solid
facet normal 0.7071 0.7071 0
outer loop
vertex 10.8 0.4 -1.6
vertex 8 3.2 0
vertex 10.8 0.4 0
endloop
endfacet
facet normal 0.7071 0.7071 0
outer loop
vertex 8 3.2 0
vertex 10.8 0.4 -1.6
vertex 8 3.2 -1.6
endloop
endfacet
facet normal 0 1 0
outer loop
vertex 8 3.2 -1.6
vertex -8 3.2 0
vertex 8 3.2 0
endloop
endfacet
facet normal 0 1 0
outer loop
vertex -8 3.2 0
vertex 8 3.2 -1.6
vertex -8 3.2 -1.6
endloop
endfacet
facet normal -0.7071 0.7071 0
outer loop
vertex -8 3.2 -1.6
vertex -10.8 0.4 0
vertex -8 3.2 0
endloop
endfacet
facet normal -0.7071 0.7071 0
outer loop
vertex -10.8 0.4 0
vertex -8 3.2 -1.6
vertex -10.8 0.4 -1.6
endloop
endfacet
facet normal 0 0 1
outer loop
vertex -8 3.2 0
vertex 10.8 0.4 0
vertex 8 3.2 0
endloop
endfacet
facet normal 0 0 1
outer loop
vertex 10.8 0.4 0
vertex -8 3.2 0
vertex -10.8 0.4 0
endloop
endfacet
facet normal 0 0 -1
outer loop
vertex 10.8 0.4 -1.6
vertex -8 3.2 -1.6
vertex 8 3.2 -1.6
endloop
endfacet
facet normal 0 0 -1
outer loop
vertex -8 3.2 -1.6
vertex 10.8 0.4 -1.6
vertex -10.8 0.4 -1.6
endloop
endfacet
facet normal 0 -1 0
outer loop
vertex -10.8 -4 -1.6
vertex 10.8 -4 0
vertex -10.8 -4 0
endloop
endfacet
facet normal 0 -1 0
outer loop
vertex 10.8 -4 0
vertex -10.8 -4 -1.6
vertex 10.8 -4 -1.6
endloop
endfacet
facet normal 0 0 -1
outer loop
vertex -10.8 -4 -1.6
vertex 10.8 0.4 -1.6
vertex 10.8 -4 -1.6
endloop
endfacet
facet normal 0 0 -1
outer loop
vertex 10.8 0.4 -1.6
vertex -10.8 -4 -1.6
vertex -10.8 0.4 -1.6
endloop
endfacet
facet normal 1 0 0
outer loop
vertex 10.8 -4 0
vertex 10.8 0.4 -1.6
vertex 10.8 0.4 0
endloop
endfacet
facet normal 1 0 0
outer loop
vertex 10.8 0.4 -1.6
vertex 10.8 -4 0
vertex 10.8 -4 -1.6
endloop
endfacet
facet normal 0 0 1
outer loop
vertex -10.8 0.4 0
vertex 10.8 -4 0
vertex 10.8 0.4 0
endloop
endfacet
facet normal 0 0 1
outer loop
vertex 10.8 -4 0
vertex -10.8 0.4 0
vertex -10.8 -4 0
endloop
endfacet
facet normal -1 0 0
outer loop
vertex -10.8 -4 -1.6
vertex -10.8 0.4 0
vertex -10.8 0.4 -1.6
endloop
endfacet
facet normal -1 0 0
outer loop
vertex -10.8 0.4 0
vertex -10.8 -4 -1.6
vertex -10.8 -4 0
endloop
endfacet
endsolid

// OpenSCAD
// file: ../p/rect3.scad
use <../lib.scad>
function ldraw_lib__rect3() = [
// 0 Rectangle with 3 Edges
// 0 Name: rect3.dat
// 0 Author: Mark Kennedy [mkennedy]
// 0 !LDRAW_ORG Primitive UPDATE 2010-01
// 0 !LICENSE Licensed under CC BY 2.0 and CC BY 4.0 : see CAreadme.txt
// 
// 0 BFC CERTIFY CCW
  [0,"BFC","CERTIFY"],
  [0,"BFC","CCW"],
// 
// 0 !HISTORY 2003-08-01 [PTadmin] Official Update 2003-02
// 0 !HISTORY 2007-06-24 [PTadmin] Header formatted for Contributor Agreement
// 0 !HISTORY 2008-07-01 [PTadmin] Official Update 2008-01
// 0 !HISTORY 2010-01-17 [mikeheide] Change winding to CCW
// 0 !HISTORY 2010-04-05 [PTadmin] Official Update 2010-01
// 
// 
// 2 24 1 0 1 -1 0 1
  [2,24,1,0,1,-1,0,1],
// 2 24 1 0 1 1 0 -1
  [2,24,1,0,1,1,0,-1],
// 2 24 -1 0 1 -1 0 -1
  [2,24,-1,0,1,-1,0,-1],
// 4 16 -1 0 1 -1 0 -1 1 0 -1 1 0 1
  [4,16,-1,0,1,-1,0,-1,1,0,-1,1,0,1],
// 0 //
];
module ldraw_lib__rect3(step=0, col=false, unit=2/5, alt=false, line=0.2, solid=!$preview)
    makepoly(ldraw_lib__rect3(), step=step, col=col, unit=unit, alt=alt, line=line, solid=solid);
ldraw_lib__rect3(line=0.2);
// file: ../p/rect.scad
use <../lib.scad>
function ldraw_lib__rect() = [
// 0 Rectangle
// 0 Name: rect.dat
// 0 Author: James Jessiman
// 0 !LDRAW_ORG Primitive UPDATE 2010-01
// 0 !LICENSE Licensed under CC BY 2.0 and CC BY 4.0 : see CAreadme.txt
// 
// 0 BFC CERTIFY CCW
  [0,"BFC","CERTIFY"],
  [0,"BFC","CCW"],
// 
// 0 !HISTORY 2002-04-05 [hafhead] Added BFC statement
// 0 !HISTORY 2002-04-25 [PTadmin] Official Update 2002-02
// 0 !HISTORY 2007-06-24 [PTadmin] Header formatted for Contributor Agreement
// 0 !HISTORY 2008-07-01 [PTadmin] Official Update 2008-01
// 0 !HISTORY 2010-01-17 [mikeheide] changed winding to CCW
// 0 !HISTORY 2010-04-05 [PTadmin] Official Update 2010-01
// 
// 
// 2 24 1 0 1 -1 0 1
  [2,24,1,0,1,-1,0,1],
// 2 24 -1 0 1 -1 0 -1
  [2,24,-1,0,1,-1,0,-1],
// 2 24 -1 0 -1 1 0 -1
  [2,24,-1,0,-1,1,0,-1],
// 2 24 1 0 -1 1 0 1
  [2,24,1,0,-1,1,0,1],
// 4 16 -1 0 1 -1 0 -1 1 0 -1 1 0 1
  [4,16,-1,0,1,-1,0,-1,1,0,-1,1,0,1],
// 0
];
module ldraw_lib__rect(step=0, col=false, unit=2/5, alt=false, line=0.2, solid=!$preview)
    makepoly(ldraw_lib__rect(), step=step, col=col, unit=unit, alt=alt, line=line, solid=solid);
ldraw_lib__rect(line=0.2);
// file: ../p/box5-4a.scad
use <../lib.scad>
function ldraw_lib__box5_4a() = [
// 0 Box with 5 Faces without 4 Adjacent Edges
// 0 Name: box5-4a.dat
// 0 Author: Guy Vivan [guyvivan]
// 0 !LDRAW_ORG Primitive UPDATE 2009-01
// 0 !LICENSE Licensed under CC BY 2.0 and CC BY 4.0 : see CAreadme.txt
// 
// 0 BFC CERTIFY CCW
  [0,"BFC","CERTIFY"],
  [0,"BFC","CCW"],
// 
// 0 !HISTORY 2009-05-02 [PTadmin] Official Update 2009-01
// 
// 
// 2 24 1 1 1 -1 1 1
  [2,24,1,1,1,-1,1,1],
// 2 24 -1 1 1 -1 1 -1
  [2,24,-1,1,1,-1,1,-1],
// 2 24 -1 1 -1 1 1 -1
  [2,24,-1,1,-1,1,1,-1],
// 2 24 1 1 -1 1 1 1
  [2,24,1,1,-1,1,1,1],
// 2 24 1 0 1 1 1 1
  [2,24,1,0,1,1,1,1],
// 2 24 -1 0 1 -1 1 1
  [2,24,-1,0,1,-1,1,1],
// 2 24 1 0 -1 1 1 -1
  [2,24,1,0,-1,1,1,-1],
// 2 24 -1 0 -1 -1 1 -1
  [2,24,-1,0,-1,-1,1,-1],
// 4 16 1 1 -1 -1 1 -1 -1 1 1 1 1 1
  [4,16,1,1,-1,-1,1,-1,-1,1,1,1,1,1],
// 4 16 -1 1 1 -1 0 1 1 0 1 1 1 1
  [4,16,-1,1,1,-1,0,1,1,0,1,1,1,1],
// 4 16 -1 1 -1 -1 0 -1 -1 0 1 -1 1 1
  [4,16,-1,1,-1,-1,0,-1,-1,0,1,-1,1,1],
// 4 16 1 1 -1 1 0 -1 -1 0 -1 -1 1 -1
  [4,16,1,1,-1,1,0,-1,-1,0,-1,-1,1,-1],
// 4 16 1 1 1 1 0 1 1 0 -1 1 1 -1
  [4,16,1,1,1,1,0,1,1,0,-1,1,1,-1],
// 0
];
module ldraw_lib__box5_4a(step=0, col=false, unit=2/5, alt=false, line=0.2, solid=!$preview)
    makepoly(ldraw_lib__box5_4a(), step=step, col=col, unit=unit, alt=alt, line=line, solid=solid);
ldraw_lib__box5_4a(line=0.2);
// main file
use <../lib.scad>
use <../p/box5-4a.scad>
use <../p/rect.scad>
use <../p/rect3.scad>
function ldraw_lib__11236() = [
// 0 ~Electric Mindstorms EV3 IR-Beacon Rectangular Button
// 0 Name: 11236.dat
// 0 Author: Philippe Hurbain [Philo]
// 0 !LDRAW_ORG Part UPDATE 2013-02
// 0 !LICENSE Licensed under CC BY 2.0 and CC BY 4.0 : see CAreadme.txt
// 
// 0 BFC CERTIFY CCW
  [0,"BFC","CERTIFY"],
  [0,"BFC","CCW"],
// 
// 0 !HISTORY 2012-05-20 {LEGO MINDSTORMS Team} Original part shape
// 0 !HISTORY 2012-10-20 [Philo] Complete rebuild for LDraw Parts Tracker
// 0 !HISTORY 2013-12-23 [PTadmin] Official Update 2013-02
// 
// 
// 1 16 23.5 2 4.5 -3.5 -1 0 0 0 -2 3.5 -1 0 rect.dat
  [1,16,23.5,2,4.5,-3.5,-1,0,0,0,-2,3.5,-1,0, ldraw_lib__rect()],
// 1 16 0 2 8 0 0 -20 2 0 0 0 -1 0 rect3.dat
  [1,16,0,2,8,0,0,-20,2,0,0,0,-1,0, ldraw_lib__rect3()],
// 1 16 -23.5 2 4.5 0 1 -3.5 2 0 0 0 -1 -3.5 rect3.dat
  [1,16,-23.5,2,4.5,0,1,-3.5,2,0,0,0,-1,-3.5, ldraw_lib__rect3()],
// 4 16 20 0 8 -20 0 8 -27 0 1 27 0 1
  [4,16,20,0,8,-20,0,8,-27,0,1,27,0,1],
// 4 16 27 4 1 -27 4 1 -20 4 8 20 4 8
  [4,16,27,4,1,-27,4,1,-20,4,8,20,4,8],
// 1 16 0 2 1 -27 0 0 0 0 2 0 -11 0 box5-4a.dat
  [1,16,0,2,1,-27,0,0,0,0,2,0,-11,0, ldraw_lib__box5_4a()],
];
module ldraw_lib__11236(step=0, col=false, unit=2/5, alt=false, line=0.2, solid=!$preview)
    makepoly(ldraw_lib__11236(), step=step, col=col, unit=unit, alt=alt, line=line, solid=solid);
ldraw_lib__11236(line=0.2);
